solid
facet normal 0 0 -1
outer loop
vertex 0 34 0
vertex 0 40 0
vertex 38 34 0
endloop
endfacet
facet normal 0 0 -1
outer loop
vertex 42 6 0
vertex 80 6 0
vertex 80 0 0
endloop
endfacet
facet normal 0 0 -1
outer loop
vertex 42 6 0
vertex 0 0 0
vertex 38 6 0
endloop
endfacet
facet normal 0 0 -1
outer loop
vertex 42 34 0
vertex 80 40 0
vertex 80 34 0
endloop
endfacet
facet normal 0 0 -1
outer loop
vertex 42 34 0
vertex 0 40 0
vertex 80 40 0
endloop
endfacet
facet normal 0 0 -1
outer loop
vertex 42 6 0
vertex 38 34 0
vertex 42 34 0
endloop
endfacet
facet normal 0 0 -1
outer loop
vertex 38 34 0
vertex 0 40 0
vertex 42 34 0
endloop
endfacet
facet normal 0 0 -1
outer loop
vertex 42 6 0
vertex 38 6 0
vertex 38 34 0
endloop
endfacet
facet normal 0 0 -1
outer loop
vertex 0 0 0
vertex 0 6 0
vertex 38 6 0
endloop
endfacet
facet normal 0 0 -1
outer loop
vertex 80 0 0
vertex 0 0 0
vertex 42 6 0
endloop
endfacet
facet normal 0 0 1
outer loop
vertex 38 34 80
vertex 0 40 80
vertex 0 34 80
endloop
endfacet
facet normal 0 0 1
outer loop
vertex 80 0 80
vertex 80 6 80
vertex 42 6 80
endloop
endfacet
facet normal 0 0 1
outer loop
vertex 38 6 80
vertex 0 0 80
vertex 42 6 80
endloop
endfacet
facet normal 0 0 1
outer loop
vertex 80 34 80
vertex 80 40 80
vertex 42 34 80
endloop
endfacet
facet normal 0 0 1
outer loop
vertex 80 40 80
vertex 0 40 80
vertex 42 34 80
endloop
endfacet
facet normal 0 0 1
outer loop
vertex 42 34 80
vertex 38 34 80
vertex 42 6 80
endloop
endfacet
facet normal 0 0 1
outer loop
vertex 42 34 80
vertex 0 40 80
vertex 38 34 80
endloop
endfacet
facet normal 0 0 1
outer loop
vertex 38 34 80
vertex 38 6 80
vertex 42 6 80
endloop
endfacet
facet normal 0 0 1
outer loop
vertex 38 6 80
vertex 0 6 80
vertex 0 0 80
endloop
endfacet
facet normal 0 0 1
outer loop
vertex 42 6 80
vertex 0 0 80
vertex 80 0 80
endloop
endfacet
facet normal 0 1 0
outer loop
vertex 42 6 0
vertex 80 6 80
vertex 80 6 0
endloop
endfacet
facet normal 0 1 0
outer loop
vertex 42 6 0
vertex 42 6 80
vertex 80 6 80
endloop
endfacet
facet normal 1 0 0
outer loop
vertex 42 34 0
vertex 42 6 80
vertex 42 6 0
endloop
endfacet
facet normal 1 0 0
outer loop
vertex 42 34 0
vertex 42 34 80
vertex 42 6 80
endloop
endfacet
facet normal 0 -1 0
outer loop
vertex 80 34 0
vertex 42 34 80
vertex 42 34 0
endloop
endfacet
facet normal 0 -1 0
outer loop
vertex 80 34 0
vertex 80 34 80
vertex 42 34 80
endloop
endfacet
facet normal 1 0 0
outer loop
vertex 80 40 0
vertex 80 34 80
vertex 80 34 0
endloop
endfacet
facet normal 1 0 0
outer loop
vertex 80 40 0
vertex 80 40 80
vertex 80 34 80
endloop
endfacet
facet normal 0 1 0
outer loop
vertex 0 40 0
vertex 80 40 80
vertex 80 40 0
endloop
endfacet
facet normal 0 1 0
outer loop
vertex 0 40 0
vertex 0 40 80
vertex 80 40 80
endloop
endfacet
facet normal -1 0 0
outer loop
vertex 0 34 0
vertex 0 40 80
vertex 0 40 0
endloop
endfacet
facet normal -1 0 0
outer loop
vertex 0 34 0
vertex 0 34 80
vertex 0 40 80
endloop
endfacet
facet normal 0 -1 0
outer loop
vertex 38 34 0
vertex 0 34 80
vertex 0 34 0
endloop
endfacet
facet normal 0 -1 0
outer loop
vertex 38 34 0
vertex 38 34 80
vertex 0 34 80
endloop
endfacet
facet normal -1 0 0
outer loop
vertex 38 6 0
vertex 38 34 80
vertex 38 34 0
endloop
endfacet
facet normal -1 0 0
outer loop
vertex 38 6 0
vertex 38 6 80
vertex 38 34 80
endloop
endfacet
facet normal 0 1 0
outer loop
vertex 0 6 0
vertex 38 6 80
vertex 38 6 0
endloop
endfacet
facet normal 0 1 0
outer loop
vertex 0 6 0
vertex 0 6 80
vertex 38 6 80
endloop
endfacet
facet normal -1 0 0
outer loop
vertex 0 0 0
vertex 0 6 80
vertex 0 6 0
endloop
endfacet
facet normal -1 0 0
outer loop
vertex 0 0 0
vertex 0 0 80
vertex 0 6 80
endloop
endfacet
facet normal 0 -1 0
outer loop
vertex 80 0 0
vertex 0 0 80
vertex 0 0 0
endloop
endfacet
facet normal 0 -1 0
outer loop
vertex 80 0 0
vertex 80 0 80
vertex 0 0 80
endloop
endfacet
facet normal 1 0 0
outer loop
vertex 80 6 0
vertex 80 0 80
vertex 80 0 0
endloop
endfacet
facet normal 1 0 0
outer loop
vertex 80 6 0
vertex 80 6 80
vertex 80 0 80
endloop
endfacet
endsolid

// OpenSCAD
$fn = 32;

// ----------------------------------------------------------------------
// Structural section: ibeam 80 x 40 mm
// ----------------------------------------------------------------------

// --- parameters (mm) ---
sec_w = 80;               // section width, X
sec_h = 40;               // section height, Y
flange_t = 6;             // flange thickness
web_t = 4;                // web thickness
plate_t = 80;             // cut length, Z (extrusion height)

profile = [[0, 0], [80, 0], [80, 6], [42, 6], [42, 34], [80, 34], [80, 40], [0, 40], [0, 34], [38, 34], [38, 6], [0, 6]];  // primary outline, 12 points, counter clockwise

// --- the one profile operation ---
linear_extrude(height = plate_t) polygon(points = profile);
